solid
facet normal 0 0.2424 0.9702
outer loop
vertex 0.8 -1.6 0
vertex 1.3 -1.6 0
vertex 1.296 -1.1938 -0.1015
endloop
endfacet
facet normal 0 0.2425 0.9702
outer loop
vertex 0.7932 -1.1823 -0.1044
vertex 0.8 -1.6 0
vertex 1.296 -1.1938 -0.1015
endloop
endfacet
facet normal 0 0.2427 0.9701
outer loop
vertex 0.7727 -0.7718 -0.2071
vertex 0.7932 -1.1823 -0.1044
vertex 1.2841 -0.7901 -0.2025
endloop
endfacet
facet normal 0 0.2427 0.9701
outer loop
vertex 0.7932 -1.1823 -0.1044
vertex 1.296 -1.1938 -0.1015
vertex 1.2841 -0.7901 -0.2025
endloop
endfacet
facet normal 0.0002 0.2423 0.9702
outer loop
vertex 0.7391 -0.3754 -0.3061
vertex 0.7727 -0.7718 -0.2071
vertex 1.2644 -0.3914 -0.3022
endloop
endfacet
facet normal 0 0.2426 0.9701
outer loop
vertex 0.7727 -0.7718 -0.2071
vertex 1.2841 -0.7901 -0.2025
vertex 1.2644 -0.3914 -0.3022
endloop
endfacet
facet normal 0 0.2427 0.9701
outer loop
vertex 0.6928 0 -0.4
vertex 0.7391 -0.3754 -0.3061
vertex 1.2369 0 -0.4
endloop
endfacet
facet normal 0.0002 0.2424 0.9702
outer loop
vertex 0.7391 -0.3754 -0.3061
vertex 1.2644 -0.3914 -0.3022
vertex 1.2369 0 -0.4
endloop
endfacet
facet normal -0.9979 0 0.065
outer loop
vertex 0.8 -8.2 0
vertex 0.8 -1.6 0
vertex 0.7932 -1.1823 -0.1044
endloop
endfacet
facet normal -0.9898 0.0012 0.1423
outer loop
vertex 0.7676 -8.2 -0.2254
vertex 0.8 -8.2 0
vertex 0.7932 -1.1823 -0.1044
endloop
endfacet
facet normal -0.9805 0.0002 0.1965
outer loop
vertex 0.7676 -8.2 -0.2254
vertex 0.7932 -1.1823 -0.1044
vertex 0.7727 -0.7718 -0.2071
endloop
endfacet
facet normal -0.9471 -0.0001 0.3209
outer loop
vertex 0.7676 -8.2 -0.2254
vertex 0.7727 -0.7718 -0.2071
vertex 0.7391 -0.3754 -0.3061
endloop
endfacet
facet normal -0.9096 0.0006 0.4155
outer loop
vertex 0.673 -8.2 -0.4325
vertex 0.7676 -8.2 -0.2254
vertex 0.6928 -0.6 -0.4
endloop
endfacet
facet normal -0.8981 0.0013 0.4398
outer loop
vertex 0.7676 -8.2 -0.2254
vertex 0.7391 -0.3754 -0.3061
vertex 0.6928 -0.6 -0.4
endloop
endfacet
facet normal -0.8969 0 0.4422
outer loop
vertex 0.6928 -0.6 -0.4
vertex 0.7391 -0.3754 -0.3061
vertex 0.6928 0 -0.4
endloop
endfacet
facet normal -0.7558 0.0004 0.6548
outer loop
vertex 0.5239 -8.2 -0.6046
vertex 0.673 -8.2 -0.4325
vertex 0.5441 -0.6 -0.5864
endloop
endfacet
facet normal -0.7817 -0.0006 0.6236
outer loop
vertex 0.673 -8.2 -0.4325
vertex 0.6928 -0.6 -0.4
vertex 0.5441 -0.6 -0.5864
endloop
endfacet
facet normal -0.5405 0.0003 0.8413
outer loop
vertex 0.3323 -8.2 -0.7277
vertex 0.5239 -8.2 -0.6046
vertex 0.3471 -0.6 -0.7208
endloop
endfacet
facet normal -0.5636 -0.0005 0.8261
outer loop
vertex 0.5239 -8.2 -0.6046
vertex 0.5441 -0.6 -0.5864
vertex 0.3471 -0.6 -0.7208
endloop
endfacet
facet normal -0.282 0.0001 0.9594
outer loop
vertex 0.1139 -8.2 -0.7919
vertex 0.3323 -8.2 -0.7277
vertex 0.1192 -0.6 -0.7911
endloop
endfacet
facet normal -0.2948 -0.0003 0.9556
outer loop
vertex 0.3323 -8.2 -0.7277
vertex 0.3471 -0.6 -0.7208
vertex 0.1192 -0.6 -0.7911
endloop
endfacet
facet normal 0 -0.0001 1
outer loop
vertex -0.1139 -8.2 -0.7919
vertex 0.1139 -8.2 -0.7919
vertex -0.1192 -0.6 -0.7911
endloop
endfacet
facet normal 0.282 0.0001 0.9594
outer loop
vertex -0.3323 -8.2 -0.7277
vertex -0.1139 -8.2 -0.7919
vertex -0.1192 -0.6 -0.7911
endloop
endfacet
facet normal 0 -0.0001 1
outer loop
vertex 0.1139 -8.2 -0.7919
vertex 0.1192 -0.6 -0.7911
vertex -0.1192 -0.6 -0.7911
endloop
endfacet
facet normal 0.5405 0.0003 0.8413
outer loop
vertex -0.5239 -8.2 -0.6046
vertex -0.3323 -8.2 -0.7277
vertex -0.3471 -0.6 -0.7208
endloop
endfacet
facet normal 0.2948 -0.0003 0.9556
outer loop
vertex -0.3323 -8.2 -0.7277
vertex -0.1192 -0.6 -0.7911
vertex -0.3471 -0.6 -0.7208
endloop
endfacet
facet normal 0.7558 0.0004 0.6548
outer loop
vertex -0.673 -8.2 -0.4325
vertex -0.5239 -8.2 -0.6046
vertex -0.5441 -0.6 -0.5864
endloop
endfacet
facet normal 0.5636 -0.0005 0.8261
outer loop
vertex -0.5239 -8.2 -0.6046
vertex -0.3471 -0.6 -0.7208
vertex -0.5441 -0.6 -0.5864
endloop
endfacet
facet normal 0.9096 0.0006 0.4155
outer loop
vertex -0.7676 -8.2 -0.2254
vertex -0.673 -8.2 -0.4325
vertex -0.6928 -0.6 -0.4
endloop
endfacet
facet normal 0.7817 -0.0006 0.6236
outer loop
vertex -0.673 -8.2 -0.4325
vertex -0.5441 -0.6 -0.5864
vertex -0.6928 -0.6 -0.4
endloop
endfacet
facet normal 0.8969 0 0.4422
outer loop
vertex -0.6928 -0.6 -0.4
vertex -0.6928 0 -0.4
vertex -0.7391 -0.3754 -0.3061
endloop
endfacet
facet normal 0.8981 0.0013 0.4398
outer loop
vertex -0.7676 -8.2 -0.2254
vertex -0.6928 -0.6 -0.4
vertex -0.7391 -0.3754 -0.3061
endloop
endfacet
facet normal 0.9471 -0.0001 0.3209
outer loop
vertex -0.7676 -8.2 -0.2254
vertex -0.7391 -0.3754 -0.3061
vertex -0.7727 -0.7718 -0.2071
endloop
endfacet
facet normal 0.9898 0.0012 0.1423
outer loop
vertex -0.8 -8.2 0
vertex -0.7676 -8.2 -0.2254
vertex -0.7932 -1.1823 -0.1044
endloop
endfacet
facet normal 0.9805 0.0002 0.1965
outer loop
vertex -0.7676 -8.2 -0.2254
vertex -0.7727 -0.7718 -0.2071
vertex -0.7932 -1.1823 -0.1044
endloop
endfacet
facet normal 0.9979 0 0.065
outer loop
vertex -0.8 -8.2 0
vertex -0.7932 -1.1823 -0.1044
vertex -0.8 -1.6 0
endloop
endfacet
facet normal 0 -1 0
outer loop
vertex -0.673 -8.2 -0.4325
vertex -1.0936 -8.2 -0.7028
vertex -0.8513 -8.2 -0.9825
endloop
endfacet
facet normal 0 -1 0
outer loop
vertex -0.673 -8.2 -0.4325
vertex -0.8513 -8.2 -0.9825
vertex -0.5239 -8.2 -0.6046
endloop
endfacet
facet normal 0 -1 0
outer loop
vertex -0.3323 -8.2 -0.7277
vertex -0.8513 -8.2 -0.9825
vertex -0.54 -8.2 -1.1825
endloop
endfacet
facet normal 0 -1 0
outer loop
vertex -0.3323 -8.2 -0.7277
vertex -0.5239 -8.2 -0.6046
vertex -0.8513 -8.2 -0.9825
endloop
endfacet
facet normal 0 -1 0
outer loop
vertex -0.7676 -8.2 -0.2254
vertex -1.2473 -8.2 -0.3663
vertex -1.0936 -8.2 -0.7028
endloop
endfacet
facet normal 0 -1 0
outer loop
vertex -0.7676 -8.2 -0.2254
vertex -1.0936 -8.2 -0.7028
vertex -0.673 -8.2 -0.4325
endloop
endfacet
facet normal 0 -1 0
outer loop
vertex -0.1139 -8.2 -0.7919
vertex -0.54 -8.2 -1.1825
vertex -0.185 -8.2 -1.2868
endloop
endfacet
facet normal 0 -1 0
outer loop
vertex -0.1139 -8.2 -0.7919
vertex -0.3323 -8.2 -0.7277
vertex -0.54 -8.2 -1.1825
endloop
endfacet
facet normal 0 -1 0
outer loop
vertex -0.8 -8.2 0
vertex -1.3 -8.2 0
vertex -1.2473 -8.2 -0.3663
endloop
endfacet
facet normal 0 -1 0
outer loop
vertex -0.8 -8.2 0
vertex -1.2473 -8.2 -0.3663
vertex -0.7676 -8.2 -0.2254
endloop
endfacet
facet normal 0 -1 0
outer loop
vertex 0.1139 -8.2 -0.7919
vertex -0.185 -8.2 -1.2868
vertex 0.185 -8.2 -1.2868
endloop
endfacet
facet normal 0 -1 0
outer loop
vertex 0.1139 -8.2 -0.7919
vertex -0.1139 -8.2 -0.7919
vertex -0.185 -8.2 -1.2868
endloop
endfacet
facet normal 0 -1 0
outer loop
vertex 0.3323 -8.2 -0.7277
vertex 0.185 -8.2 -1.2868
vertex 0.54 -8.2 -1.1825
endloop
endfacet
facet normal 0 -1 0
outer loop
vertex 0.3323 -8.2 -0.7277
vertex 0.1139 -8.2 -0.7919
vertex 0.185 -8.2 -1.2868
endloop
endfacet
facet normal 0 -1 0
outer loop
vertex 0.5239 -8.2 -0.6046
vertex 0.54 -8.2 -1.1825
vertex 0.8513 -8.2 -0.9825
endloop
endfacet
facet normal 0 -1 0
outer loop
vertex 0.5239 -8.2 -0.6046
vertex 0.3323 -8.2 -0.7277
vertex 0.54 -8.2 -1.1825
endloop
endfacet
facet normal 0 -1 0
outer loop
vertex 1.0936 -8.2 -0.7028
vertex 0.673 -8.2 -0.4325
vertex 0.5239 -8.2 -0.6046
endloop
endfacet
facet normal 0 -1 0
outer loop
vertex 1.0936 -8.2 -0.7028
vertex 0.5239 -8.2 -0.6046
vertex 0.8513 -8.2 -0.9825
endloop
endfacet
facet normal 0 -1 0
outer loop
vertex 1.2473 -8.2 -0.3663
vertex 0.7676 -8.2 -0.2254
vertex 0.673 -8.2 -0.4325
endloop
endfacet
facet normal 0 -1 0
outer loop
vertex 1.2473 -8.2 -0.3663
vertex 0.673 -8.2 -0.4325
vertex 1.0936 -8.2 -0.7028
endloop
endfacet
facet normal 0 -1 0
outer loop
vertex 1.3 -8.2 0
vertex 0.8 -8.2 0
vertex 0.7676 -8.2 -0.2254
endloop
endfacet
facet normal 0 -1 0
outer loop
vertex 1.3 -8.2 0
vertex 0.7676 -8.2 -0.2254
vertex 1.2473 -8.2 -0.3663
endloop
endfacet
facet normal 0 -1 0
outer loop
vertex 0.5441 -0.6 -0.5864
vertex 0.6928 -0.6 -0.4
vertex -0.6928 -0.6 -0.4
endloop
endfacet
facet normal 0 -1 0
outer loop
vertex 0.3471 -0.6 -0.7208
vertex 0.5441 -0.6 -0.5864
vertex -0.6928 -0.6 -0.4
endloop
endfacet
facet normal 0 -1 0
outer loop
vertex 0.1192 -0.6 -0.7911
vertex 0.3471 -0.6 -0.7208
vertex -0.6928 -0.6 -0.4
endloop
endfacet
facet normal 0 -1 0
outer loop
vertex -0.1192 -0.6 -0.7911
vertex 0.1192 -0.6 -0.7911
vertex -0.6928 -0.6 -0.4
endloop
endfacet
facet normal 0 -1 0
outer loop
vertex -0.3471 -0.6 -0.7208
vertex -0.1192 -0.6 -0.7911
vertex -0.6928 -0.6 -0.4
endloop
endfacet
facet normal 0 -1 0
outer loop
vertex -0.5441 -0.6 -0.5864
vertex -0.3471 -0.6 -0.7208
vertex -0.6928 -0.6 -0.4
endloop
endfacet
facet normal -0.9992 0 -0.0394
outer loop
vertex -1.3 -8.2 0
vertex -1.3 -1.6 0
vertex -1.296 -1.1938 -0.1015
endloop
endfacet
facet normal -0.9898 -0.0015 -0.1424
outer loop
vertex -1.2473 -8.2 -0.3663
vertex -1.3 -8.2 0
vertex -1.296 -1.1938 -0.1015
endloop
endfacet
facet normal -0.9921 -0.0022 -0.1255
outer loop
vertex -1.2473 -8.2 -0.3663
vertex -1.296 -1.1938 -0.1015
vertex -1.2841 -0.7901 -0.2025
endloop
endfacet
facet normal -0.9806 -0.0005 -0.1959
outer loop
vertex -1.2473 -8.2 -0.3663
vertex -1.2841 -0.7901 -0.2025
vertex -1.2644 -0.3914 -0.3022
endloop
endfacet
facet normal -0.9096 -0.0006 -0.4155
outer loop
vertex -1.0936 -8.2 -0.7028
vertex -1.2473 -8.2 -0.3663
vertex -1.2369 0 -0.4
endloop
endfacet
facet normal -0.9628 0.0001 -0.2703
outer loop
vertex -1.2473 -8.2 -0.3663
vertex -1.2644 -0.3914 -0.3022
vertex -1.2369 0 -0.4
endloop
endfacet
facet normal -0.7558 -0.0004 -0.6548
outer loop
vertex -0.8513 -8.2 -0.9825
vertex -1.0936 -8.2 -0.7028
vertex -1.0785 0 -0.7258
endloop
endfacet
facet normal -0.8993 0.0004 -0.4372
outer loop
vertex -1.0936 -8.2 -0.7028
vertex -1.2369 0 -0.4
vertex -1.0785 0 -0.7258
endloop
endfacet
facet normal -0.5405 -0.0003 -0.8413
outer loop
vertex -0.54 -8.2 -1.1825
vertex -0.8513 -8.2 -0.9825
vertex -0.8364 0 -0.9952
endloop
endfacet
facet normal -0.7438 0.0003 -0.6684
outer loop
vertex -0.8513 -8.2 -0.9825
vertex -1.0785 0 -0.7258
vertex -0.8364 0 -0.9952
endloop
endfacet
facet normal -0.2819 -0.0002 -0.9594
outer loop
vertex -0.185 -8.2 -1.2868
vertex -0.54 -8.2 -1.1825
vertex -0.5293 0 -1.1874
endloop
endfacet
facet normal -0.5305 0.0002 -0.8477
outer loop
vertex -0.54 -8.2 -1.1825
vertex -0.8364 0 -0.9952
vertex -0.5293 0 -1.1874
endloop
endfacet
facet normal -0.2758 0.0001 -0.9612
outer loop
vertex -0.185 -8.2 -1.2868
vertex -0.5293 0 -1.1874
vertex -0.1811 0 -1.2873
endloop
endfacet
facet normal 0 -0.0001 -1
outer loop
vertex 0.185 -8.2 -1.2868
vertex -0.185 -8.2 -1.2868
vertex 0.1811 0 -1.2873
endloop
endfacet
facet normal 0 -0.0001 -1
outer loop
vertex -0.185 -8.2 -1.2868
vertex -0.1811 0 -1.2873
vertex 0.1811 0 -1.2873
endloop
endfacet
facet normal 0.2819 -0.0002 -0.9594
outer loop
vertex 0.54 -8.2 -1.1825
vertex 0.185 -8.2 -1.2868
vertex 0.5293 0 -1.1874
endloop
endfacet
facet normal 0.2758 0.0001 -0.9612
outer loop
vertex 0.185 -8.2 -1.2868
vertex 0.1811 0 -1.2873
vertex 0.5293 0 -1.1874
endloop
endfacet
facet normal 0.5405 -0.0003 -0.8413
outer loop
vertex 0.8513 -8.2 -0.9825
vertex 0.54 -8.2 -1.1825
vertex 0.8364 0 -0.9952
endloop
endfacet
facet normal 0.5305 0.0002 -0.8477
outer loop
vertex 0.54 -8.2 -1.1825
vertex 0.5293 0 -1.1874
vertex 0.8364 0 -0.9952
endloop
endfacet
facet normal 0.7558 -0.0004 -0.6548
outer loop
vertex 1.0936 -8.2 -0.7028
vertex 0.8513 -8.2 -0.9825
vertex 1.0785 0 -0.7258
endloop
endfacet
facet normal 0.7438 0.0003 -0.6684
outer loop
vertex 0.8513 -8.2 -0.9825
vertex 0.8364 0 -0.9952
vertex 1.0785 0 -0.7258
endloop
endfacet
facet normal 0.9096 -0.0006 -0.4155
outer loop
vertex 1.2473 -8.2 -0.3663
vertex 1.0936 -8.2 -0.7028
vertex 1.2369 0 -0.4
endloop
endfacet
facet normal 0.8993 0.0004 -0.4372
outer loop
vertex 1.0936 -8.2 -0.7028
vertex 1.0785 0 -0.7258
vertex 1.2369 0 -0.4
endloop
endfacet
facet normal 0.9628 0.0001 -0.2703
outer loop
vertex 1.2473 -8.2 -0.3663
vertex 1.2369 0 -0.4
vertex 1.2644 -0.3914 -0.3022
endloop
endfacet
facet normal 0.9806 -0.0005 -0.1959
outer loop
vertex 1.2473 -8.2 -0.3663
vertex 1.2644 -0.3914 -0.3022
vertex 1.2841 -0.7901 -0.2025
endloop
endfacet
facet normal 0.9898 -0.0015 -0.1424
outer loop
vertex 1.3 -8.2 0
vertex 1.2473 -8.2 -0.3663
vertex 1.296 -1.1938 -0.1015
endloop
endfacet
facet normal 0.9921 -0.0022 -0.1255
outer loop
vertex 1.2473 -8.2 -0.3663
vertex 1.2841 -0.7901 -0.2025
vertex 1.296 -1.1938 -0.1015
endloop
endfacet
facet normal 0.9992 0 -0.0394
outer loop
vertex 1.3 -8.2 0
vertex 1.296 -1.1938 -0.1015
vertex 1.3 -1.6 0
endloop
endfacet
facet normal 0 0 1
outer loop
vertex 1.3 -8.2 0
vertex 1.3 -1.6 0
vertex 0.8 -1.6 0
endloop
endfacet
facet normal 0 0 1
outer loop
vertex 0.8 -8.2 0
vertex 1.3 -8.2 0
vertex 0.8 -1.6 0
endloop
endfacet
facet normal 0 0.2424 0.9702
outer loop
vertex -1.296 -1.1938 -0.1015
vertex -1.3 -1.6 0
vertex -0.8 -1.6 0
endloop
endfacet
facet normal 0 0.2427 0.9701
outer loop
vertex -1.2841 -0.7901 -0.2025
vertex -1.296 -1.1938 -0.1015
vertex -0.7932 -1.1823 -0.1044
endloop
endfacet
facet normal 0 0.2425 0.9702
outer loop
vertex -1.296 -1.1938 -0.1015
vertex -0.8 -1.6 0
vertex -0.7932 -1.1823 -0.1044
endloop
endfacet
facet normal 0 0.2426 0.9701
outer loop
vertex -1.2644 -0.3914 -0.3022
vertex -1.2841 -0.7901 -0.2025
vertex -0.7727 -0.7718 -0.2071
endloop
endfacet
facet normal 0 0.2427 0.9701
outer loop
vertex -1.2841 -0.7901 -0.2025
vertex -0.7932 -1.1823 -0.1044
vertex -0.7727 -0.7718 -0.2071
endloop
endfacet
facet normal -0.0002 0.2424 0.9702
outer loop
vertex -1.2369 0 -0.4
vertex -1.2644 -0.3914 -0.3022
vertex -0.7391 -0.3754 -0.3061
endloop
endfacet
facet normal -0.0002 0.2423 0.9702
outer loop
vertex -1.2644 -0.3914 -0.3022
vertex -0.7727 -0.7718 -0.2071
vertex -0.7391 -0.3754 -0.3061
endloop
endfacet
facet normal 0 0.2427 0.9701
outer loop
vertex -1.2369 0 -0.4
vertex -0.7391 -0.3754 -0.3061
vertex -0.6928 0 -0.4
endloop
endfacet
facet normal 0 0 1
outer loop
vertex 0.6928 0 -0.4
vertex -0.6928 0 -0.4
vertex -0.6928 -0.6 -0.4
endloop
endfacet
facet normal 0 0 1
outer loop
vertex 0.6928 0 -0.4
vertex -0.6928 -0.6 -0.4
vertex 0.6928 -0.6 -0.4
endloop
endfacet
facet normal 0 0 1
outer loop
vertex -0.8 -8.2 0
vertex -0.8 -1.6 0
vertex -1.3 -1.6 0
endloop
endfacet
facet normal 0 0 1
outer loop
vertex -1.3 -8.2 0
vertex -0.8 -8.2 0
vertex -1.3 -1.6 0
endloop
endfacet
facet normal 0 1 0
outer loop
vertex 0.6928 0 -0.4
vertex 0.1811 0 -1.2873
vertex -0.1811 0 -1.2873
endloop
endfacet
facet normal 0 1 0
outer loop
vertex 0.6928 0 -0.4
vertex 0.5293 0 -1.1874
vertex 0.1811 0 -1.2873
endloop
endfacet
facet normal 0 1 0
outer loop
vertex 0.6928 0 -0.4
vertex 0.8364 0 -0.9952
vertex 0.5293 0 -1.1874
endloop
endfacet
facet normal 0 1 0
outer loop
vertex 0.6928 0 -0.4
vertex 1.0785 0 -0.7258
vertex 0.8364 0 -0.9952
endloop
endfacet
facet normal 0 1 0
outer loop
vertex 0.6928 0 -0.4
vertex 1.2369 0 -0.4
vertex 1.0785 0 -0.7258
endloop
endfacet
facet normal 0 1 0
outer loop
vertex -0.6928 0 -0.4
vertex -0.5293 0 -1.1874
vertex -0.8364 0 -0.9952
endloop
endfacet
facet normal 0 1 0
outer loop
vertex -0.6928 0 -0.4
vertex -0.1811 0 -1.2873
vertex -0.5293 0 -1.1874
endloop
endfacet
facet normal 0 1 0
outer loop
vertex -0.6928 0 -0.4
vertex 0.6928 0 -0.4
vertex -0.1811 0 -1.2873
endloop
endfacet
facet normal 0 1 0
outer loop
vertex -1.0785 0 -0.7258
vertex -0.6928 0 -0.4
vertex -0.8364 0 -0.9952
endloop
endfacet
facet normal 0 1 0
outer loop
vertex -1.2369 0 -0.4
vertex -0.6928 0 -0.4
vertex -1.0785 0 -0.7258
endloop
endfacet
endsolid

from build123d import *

# Parameters (mm, degrees)
F1_DEPTH = 8.2
F3_DEPTH = 15
F5_DEPTH = 0.6


with BuildPart() as f1:
    # F0 (on Front) → F1 (new body)
    with BuildSketch(Plane.XZ):
        with BuildLine():
            Line((1.3, 0), (0.8, 0))
            ThreePointArc((0.8, 0), (0, -0.8), (-0.8, 0))
            Line((-0.8, 0), (-1.3, 0))
            ThreePointArc((-1.3, 0), (0, -1.3), (1.3, 0))
        make_face()
    extrude(amount=F1_DEPTH)

    # F2 (on Right) → F3 (cut, symmetric)
    with BuildSketch(Plane.YZ):
        Polygon((-1.6, 0), (0, -0.4), (0, 0), align=None)
    extrude(amount=F3_DEPTH, both=True, mode=Mode.SUBTRACT)

    # F4 (on face) → F5 (join)
    with BuildSketch(Plane(origin=(0, 0, 0), x_dir=(-1, 0, 0), z_dir=(0, 1, 0))):
        with BuildLine():
            Line((0.69282, -0.4), (-0.69282, -0.4))
            ThreePointArc((-0.69282, -0.4), (0, -0.8), (0.69282, -0.4))
        make_face()
    extrude(amount=-F5_DEPTH)


solid = f1.part
